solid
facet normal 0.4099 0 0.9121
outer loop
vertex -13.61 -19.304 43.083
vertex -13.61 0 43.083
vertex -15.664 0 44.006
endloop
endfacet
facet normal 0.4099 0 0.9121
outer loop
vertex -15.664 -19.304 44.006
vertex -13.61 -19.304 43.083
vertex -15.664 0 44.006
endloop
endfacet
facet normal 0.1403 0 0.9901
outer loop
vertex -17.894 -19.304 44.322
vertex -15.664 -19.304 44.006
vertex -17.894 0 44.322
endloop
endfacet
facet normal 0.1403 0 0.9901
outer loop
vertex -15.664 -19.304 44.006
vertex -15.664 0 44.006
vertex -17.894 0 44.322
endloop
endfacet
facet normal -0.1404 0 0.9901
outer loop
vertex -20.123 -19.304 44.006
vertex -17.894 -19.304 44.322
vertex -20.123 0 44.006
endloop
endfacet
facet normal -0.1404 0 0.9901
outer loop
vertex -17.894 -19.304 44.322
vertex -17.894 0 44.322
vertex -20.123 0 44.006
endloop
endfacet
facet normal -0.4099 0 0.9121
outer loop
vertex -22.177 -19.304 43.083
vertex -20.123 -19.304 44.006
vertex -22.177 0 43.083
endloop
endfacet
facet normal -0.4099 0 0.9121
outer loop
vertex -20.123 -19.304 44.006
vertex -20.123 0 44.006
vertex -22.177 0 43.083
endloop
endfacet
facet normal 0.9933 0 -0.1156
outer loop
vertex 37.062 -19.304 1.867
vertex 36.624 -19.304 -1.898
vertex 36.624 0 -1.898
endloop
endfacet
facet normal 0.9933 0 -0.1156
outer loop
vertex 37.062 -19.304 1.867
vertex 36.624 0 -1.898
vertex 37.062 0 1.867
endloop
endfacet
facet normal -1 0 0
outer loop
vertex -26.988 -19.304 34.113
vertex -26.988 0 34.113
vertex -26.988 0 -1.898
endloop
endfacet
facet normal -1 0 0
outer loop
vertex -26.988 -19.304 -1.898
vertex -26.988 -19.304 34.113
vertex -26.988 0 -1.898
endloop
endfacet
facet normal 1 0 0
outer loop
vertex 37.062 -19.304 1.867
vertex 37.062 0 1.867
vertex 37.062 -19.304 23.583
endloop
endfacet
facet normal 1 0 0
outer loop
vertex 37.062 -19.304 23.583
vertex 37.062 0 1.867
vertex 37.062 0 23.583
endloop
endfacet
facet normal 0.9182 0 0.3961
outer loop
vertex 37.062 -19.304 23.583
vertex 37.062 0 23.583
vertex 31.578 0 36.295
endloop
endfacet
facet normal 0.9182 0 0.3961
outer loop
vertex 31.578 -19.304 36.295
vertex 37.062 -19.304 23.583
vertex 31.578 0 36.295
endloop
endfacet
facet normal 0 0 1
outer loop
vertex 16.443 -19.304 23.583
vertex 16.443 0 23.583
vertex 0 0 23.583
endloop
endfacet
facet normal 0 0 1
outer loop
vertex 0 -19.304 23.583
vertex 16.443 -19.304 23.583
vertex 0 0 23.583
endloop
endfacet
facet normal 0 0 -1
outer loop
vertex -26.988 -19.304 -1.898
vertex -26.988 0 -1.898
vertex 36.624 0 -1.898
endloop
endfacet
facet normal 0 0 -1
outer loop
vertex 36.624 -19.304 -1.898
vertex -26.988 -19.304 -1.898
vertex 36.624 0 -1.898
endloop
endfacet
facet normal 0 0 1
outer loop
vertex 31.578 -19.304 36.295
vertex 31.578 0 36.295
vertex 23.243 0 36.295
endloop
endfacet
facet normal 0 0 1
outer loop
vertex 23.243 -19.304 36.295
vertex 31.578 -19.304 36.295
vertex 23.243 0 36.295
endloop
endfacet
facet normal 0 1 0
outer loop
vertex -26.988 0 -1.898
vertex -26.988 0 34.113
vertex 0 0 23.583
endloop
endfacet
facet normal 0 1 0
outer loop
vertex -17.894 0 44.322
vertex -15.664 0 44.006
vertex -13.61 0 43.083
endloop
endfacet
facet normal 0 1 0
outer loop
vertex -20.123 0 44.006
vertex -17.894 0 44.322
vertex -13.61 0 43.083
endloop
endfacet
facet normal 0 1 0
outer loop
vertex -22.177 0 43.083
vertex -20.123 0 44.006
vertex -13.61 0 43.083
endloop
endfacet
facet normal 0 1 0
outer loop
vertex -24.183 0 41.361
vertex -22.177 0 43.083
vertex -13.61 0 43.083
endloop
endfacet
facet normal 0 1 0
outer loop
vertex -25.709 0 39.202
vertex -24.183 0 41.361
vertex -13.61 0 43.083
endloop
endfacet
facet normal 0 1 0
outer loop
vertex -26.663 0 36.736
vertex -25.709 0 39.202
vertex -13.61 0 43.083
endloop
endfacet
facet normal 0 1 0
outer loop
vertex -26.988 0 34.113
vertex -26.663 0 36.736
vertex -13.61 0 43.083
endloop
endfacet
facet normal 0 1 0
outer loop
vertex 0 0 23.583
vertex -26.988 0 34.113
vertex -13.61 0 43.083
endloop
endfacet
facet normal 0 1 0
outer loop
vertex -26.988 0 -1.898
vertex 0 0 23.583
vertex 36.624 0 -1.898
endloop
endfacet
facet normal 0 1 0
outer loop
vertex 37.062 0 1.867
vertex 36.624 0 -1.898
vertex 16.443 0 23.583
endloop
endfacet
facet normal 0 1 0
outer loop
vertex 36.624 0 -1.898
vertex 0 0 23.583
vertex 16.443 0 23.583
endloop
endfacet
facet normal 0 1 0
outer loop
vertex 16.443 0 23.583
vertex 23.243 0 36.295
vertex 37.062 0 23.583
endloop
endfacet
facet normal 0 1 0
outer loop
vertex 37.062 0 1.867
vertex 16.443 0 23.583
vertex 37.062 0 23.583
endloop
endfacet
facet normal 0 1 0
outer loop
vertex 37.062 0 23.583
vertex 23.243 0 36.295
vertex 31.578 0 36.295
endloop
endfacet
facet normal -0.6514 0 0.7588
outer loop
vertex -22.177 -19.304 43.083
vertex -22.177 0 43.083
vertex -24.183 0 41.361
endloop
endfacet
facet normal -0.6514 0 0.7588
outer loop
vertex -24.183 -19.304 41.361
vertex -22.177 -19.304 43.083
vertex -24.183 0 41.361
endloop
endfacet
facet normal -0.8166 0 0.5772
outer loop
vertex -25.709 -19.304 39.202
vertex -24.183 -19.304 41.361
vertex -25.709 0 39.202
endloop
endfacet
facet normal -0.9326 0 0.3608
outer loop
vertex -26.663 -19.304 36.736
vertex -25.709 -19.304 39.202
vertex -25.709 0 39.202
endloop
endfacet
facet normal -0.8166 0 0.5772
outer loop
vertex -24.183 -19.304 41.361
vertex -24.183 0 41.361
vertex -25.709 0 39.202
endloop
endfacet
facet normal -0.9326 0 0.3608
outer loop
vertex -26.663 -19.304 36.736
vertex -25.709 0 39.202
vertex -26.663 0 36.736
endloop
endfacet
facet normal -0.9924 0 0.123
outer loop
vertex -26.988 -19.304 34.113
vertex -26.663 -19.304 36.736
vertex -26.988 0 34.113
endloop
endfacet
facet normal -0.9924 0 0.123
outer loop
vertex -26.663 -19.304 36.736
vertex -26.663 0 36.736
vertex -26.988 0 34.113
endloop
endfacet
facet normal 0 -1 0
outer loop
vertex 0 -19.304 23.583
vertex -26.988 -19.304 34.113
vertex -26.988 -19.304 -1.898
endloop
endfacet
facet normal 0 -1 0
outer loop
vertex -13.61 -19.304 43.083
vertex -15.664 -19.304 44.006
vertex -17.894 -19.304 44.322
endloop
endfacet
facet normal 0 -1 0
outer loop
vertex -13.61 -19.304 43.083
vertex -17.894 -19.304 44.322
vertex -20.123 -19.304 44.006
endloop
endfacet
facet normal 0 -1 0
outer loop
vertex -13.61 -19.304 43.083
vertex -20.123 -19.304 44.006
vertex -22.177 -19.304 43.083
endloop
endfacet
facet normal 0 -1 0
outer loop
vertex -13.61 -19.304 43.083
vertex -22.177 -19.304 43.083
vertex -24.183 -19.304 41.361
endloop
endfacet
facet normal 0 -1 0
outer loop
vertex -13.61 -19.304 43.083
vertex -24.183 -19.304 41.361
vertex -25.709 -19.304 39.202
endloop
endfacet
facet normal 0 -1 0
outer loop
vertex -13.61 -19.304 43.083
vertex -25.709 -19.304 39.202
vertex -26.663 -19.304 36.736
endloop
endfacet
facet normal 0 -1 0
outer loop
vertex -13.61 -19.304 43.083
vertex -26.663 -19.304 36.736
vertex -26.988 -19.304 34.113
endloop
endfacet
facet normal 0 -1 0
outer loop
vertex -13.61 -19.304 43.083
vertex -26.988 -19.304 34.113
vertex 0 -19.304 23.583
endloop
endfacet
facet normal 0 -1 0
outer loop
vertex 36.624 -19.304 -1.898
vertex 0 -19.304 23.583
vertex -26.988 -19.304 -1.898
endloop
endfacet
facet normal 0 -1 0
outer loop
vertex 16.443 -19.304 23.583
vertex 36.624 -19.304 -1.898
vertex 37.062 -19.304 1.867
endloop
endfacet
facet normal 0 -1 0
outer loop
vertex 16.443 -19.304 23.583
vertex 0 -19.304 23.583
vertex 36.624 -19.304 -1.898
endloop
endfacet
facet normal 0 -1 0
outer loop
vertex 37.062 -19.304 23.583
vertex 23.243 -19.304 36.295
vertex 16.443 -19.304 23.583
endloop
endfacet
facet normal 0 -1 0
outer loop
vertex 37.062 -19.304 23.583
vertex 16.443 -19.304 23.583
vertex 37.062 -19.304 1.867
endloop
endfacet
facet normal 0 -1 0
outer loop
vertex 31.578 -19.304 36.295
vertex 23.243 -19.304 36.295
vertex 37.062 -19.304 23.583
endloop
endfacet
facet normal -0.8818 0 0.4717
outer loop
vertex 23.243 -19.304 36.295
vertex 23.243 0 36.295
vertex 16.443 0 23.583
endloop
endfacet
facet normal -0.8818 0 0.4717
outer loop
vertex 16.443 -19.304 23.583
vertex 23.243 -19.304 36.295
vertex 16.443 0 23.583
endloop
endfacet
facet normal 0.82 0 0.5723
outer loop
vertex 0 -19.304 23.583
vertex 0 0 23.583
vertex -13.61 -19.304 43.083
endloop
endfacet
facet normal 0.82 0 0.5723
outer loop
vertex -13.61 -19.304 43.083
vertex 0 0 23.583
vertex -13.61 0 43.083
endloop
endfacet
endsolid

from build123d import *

# Parameters (mm, degrees)
F1_DEPTH = 19.304


# Not quite as in the source:
# - the program builds the solid bodies; features that only make, move or delete a surface that nothing else refers to are left out


with BuildPart() as f1:
    # F0 (on Front) → F1 (new body)
    with BuildSketch(Plane.XZ):
        with BuildLine():
            Line((-26.9875, 34.112624824), (-26.9875, 1.898483652))
            Line((-26.9875, 1.898483652), (26.9875, 1.898483652))
            Line((26.9875, 1.898483652), (37.0624177158, 1.8666714896))
            Line((37.0624177158, 1.8666714896), (37.0624177158, 23.583335802))
            Line((37.0624177158, 23.583335802), (31.5784178674, 36.2954275192))
            Line((31.5784178674, 36.2954275192), (23.2427231967, 36.2954275192))
            Line((23.2427231967, 36.2954275192), (16.4425540715, 23.583335802))
            Line((16.4425540715, 23.583335802), (0, 23.583335802))
            Line((0, 23.583335802), (-13.6097995564, 43.0830909645))
            ThreePointArc((-13.6097995564, 43.0830909645), (-17.8935738167, 44.3218275192), (-22.177348077, 43.0830909645))
            ThreePointArc((-22.177348077, 43.0830909645), (-25.7090842299, 39.2019966984), (-26.9875, 34.112624824))
        make_face()
        Polygon((26.9875, 1.898483652), (-26.9875, 1.898483652), (-26.9875, -1.898483652), (26.9875, -1.898483652), (36.6236940026, -1.898483652), (37.0624177158, 1.8666714896), align=None)
    extrude(amount=F1_DEPTH)


solid = f1.part
